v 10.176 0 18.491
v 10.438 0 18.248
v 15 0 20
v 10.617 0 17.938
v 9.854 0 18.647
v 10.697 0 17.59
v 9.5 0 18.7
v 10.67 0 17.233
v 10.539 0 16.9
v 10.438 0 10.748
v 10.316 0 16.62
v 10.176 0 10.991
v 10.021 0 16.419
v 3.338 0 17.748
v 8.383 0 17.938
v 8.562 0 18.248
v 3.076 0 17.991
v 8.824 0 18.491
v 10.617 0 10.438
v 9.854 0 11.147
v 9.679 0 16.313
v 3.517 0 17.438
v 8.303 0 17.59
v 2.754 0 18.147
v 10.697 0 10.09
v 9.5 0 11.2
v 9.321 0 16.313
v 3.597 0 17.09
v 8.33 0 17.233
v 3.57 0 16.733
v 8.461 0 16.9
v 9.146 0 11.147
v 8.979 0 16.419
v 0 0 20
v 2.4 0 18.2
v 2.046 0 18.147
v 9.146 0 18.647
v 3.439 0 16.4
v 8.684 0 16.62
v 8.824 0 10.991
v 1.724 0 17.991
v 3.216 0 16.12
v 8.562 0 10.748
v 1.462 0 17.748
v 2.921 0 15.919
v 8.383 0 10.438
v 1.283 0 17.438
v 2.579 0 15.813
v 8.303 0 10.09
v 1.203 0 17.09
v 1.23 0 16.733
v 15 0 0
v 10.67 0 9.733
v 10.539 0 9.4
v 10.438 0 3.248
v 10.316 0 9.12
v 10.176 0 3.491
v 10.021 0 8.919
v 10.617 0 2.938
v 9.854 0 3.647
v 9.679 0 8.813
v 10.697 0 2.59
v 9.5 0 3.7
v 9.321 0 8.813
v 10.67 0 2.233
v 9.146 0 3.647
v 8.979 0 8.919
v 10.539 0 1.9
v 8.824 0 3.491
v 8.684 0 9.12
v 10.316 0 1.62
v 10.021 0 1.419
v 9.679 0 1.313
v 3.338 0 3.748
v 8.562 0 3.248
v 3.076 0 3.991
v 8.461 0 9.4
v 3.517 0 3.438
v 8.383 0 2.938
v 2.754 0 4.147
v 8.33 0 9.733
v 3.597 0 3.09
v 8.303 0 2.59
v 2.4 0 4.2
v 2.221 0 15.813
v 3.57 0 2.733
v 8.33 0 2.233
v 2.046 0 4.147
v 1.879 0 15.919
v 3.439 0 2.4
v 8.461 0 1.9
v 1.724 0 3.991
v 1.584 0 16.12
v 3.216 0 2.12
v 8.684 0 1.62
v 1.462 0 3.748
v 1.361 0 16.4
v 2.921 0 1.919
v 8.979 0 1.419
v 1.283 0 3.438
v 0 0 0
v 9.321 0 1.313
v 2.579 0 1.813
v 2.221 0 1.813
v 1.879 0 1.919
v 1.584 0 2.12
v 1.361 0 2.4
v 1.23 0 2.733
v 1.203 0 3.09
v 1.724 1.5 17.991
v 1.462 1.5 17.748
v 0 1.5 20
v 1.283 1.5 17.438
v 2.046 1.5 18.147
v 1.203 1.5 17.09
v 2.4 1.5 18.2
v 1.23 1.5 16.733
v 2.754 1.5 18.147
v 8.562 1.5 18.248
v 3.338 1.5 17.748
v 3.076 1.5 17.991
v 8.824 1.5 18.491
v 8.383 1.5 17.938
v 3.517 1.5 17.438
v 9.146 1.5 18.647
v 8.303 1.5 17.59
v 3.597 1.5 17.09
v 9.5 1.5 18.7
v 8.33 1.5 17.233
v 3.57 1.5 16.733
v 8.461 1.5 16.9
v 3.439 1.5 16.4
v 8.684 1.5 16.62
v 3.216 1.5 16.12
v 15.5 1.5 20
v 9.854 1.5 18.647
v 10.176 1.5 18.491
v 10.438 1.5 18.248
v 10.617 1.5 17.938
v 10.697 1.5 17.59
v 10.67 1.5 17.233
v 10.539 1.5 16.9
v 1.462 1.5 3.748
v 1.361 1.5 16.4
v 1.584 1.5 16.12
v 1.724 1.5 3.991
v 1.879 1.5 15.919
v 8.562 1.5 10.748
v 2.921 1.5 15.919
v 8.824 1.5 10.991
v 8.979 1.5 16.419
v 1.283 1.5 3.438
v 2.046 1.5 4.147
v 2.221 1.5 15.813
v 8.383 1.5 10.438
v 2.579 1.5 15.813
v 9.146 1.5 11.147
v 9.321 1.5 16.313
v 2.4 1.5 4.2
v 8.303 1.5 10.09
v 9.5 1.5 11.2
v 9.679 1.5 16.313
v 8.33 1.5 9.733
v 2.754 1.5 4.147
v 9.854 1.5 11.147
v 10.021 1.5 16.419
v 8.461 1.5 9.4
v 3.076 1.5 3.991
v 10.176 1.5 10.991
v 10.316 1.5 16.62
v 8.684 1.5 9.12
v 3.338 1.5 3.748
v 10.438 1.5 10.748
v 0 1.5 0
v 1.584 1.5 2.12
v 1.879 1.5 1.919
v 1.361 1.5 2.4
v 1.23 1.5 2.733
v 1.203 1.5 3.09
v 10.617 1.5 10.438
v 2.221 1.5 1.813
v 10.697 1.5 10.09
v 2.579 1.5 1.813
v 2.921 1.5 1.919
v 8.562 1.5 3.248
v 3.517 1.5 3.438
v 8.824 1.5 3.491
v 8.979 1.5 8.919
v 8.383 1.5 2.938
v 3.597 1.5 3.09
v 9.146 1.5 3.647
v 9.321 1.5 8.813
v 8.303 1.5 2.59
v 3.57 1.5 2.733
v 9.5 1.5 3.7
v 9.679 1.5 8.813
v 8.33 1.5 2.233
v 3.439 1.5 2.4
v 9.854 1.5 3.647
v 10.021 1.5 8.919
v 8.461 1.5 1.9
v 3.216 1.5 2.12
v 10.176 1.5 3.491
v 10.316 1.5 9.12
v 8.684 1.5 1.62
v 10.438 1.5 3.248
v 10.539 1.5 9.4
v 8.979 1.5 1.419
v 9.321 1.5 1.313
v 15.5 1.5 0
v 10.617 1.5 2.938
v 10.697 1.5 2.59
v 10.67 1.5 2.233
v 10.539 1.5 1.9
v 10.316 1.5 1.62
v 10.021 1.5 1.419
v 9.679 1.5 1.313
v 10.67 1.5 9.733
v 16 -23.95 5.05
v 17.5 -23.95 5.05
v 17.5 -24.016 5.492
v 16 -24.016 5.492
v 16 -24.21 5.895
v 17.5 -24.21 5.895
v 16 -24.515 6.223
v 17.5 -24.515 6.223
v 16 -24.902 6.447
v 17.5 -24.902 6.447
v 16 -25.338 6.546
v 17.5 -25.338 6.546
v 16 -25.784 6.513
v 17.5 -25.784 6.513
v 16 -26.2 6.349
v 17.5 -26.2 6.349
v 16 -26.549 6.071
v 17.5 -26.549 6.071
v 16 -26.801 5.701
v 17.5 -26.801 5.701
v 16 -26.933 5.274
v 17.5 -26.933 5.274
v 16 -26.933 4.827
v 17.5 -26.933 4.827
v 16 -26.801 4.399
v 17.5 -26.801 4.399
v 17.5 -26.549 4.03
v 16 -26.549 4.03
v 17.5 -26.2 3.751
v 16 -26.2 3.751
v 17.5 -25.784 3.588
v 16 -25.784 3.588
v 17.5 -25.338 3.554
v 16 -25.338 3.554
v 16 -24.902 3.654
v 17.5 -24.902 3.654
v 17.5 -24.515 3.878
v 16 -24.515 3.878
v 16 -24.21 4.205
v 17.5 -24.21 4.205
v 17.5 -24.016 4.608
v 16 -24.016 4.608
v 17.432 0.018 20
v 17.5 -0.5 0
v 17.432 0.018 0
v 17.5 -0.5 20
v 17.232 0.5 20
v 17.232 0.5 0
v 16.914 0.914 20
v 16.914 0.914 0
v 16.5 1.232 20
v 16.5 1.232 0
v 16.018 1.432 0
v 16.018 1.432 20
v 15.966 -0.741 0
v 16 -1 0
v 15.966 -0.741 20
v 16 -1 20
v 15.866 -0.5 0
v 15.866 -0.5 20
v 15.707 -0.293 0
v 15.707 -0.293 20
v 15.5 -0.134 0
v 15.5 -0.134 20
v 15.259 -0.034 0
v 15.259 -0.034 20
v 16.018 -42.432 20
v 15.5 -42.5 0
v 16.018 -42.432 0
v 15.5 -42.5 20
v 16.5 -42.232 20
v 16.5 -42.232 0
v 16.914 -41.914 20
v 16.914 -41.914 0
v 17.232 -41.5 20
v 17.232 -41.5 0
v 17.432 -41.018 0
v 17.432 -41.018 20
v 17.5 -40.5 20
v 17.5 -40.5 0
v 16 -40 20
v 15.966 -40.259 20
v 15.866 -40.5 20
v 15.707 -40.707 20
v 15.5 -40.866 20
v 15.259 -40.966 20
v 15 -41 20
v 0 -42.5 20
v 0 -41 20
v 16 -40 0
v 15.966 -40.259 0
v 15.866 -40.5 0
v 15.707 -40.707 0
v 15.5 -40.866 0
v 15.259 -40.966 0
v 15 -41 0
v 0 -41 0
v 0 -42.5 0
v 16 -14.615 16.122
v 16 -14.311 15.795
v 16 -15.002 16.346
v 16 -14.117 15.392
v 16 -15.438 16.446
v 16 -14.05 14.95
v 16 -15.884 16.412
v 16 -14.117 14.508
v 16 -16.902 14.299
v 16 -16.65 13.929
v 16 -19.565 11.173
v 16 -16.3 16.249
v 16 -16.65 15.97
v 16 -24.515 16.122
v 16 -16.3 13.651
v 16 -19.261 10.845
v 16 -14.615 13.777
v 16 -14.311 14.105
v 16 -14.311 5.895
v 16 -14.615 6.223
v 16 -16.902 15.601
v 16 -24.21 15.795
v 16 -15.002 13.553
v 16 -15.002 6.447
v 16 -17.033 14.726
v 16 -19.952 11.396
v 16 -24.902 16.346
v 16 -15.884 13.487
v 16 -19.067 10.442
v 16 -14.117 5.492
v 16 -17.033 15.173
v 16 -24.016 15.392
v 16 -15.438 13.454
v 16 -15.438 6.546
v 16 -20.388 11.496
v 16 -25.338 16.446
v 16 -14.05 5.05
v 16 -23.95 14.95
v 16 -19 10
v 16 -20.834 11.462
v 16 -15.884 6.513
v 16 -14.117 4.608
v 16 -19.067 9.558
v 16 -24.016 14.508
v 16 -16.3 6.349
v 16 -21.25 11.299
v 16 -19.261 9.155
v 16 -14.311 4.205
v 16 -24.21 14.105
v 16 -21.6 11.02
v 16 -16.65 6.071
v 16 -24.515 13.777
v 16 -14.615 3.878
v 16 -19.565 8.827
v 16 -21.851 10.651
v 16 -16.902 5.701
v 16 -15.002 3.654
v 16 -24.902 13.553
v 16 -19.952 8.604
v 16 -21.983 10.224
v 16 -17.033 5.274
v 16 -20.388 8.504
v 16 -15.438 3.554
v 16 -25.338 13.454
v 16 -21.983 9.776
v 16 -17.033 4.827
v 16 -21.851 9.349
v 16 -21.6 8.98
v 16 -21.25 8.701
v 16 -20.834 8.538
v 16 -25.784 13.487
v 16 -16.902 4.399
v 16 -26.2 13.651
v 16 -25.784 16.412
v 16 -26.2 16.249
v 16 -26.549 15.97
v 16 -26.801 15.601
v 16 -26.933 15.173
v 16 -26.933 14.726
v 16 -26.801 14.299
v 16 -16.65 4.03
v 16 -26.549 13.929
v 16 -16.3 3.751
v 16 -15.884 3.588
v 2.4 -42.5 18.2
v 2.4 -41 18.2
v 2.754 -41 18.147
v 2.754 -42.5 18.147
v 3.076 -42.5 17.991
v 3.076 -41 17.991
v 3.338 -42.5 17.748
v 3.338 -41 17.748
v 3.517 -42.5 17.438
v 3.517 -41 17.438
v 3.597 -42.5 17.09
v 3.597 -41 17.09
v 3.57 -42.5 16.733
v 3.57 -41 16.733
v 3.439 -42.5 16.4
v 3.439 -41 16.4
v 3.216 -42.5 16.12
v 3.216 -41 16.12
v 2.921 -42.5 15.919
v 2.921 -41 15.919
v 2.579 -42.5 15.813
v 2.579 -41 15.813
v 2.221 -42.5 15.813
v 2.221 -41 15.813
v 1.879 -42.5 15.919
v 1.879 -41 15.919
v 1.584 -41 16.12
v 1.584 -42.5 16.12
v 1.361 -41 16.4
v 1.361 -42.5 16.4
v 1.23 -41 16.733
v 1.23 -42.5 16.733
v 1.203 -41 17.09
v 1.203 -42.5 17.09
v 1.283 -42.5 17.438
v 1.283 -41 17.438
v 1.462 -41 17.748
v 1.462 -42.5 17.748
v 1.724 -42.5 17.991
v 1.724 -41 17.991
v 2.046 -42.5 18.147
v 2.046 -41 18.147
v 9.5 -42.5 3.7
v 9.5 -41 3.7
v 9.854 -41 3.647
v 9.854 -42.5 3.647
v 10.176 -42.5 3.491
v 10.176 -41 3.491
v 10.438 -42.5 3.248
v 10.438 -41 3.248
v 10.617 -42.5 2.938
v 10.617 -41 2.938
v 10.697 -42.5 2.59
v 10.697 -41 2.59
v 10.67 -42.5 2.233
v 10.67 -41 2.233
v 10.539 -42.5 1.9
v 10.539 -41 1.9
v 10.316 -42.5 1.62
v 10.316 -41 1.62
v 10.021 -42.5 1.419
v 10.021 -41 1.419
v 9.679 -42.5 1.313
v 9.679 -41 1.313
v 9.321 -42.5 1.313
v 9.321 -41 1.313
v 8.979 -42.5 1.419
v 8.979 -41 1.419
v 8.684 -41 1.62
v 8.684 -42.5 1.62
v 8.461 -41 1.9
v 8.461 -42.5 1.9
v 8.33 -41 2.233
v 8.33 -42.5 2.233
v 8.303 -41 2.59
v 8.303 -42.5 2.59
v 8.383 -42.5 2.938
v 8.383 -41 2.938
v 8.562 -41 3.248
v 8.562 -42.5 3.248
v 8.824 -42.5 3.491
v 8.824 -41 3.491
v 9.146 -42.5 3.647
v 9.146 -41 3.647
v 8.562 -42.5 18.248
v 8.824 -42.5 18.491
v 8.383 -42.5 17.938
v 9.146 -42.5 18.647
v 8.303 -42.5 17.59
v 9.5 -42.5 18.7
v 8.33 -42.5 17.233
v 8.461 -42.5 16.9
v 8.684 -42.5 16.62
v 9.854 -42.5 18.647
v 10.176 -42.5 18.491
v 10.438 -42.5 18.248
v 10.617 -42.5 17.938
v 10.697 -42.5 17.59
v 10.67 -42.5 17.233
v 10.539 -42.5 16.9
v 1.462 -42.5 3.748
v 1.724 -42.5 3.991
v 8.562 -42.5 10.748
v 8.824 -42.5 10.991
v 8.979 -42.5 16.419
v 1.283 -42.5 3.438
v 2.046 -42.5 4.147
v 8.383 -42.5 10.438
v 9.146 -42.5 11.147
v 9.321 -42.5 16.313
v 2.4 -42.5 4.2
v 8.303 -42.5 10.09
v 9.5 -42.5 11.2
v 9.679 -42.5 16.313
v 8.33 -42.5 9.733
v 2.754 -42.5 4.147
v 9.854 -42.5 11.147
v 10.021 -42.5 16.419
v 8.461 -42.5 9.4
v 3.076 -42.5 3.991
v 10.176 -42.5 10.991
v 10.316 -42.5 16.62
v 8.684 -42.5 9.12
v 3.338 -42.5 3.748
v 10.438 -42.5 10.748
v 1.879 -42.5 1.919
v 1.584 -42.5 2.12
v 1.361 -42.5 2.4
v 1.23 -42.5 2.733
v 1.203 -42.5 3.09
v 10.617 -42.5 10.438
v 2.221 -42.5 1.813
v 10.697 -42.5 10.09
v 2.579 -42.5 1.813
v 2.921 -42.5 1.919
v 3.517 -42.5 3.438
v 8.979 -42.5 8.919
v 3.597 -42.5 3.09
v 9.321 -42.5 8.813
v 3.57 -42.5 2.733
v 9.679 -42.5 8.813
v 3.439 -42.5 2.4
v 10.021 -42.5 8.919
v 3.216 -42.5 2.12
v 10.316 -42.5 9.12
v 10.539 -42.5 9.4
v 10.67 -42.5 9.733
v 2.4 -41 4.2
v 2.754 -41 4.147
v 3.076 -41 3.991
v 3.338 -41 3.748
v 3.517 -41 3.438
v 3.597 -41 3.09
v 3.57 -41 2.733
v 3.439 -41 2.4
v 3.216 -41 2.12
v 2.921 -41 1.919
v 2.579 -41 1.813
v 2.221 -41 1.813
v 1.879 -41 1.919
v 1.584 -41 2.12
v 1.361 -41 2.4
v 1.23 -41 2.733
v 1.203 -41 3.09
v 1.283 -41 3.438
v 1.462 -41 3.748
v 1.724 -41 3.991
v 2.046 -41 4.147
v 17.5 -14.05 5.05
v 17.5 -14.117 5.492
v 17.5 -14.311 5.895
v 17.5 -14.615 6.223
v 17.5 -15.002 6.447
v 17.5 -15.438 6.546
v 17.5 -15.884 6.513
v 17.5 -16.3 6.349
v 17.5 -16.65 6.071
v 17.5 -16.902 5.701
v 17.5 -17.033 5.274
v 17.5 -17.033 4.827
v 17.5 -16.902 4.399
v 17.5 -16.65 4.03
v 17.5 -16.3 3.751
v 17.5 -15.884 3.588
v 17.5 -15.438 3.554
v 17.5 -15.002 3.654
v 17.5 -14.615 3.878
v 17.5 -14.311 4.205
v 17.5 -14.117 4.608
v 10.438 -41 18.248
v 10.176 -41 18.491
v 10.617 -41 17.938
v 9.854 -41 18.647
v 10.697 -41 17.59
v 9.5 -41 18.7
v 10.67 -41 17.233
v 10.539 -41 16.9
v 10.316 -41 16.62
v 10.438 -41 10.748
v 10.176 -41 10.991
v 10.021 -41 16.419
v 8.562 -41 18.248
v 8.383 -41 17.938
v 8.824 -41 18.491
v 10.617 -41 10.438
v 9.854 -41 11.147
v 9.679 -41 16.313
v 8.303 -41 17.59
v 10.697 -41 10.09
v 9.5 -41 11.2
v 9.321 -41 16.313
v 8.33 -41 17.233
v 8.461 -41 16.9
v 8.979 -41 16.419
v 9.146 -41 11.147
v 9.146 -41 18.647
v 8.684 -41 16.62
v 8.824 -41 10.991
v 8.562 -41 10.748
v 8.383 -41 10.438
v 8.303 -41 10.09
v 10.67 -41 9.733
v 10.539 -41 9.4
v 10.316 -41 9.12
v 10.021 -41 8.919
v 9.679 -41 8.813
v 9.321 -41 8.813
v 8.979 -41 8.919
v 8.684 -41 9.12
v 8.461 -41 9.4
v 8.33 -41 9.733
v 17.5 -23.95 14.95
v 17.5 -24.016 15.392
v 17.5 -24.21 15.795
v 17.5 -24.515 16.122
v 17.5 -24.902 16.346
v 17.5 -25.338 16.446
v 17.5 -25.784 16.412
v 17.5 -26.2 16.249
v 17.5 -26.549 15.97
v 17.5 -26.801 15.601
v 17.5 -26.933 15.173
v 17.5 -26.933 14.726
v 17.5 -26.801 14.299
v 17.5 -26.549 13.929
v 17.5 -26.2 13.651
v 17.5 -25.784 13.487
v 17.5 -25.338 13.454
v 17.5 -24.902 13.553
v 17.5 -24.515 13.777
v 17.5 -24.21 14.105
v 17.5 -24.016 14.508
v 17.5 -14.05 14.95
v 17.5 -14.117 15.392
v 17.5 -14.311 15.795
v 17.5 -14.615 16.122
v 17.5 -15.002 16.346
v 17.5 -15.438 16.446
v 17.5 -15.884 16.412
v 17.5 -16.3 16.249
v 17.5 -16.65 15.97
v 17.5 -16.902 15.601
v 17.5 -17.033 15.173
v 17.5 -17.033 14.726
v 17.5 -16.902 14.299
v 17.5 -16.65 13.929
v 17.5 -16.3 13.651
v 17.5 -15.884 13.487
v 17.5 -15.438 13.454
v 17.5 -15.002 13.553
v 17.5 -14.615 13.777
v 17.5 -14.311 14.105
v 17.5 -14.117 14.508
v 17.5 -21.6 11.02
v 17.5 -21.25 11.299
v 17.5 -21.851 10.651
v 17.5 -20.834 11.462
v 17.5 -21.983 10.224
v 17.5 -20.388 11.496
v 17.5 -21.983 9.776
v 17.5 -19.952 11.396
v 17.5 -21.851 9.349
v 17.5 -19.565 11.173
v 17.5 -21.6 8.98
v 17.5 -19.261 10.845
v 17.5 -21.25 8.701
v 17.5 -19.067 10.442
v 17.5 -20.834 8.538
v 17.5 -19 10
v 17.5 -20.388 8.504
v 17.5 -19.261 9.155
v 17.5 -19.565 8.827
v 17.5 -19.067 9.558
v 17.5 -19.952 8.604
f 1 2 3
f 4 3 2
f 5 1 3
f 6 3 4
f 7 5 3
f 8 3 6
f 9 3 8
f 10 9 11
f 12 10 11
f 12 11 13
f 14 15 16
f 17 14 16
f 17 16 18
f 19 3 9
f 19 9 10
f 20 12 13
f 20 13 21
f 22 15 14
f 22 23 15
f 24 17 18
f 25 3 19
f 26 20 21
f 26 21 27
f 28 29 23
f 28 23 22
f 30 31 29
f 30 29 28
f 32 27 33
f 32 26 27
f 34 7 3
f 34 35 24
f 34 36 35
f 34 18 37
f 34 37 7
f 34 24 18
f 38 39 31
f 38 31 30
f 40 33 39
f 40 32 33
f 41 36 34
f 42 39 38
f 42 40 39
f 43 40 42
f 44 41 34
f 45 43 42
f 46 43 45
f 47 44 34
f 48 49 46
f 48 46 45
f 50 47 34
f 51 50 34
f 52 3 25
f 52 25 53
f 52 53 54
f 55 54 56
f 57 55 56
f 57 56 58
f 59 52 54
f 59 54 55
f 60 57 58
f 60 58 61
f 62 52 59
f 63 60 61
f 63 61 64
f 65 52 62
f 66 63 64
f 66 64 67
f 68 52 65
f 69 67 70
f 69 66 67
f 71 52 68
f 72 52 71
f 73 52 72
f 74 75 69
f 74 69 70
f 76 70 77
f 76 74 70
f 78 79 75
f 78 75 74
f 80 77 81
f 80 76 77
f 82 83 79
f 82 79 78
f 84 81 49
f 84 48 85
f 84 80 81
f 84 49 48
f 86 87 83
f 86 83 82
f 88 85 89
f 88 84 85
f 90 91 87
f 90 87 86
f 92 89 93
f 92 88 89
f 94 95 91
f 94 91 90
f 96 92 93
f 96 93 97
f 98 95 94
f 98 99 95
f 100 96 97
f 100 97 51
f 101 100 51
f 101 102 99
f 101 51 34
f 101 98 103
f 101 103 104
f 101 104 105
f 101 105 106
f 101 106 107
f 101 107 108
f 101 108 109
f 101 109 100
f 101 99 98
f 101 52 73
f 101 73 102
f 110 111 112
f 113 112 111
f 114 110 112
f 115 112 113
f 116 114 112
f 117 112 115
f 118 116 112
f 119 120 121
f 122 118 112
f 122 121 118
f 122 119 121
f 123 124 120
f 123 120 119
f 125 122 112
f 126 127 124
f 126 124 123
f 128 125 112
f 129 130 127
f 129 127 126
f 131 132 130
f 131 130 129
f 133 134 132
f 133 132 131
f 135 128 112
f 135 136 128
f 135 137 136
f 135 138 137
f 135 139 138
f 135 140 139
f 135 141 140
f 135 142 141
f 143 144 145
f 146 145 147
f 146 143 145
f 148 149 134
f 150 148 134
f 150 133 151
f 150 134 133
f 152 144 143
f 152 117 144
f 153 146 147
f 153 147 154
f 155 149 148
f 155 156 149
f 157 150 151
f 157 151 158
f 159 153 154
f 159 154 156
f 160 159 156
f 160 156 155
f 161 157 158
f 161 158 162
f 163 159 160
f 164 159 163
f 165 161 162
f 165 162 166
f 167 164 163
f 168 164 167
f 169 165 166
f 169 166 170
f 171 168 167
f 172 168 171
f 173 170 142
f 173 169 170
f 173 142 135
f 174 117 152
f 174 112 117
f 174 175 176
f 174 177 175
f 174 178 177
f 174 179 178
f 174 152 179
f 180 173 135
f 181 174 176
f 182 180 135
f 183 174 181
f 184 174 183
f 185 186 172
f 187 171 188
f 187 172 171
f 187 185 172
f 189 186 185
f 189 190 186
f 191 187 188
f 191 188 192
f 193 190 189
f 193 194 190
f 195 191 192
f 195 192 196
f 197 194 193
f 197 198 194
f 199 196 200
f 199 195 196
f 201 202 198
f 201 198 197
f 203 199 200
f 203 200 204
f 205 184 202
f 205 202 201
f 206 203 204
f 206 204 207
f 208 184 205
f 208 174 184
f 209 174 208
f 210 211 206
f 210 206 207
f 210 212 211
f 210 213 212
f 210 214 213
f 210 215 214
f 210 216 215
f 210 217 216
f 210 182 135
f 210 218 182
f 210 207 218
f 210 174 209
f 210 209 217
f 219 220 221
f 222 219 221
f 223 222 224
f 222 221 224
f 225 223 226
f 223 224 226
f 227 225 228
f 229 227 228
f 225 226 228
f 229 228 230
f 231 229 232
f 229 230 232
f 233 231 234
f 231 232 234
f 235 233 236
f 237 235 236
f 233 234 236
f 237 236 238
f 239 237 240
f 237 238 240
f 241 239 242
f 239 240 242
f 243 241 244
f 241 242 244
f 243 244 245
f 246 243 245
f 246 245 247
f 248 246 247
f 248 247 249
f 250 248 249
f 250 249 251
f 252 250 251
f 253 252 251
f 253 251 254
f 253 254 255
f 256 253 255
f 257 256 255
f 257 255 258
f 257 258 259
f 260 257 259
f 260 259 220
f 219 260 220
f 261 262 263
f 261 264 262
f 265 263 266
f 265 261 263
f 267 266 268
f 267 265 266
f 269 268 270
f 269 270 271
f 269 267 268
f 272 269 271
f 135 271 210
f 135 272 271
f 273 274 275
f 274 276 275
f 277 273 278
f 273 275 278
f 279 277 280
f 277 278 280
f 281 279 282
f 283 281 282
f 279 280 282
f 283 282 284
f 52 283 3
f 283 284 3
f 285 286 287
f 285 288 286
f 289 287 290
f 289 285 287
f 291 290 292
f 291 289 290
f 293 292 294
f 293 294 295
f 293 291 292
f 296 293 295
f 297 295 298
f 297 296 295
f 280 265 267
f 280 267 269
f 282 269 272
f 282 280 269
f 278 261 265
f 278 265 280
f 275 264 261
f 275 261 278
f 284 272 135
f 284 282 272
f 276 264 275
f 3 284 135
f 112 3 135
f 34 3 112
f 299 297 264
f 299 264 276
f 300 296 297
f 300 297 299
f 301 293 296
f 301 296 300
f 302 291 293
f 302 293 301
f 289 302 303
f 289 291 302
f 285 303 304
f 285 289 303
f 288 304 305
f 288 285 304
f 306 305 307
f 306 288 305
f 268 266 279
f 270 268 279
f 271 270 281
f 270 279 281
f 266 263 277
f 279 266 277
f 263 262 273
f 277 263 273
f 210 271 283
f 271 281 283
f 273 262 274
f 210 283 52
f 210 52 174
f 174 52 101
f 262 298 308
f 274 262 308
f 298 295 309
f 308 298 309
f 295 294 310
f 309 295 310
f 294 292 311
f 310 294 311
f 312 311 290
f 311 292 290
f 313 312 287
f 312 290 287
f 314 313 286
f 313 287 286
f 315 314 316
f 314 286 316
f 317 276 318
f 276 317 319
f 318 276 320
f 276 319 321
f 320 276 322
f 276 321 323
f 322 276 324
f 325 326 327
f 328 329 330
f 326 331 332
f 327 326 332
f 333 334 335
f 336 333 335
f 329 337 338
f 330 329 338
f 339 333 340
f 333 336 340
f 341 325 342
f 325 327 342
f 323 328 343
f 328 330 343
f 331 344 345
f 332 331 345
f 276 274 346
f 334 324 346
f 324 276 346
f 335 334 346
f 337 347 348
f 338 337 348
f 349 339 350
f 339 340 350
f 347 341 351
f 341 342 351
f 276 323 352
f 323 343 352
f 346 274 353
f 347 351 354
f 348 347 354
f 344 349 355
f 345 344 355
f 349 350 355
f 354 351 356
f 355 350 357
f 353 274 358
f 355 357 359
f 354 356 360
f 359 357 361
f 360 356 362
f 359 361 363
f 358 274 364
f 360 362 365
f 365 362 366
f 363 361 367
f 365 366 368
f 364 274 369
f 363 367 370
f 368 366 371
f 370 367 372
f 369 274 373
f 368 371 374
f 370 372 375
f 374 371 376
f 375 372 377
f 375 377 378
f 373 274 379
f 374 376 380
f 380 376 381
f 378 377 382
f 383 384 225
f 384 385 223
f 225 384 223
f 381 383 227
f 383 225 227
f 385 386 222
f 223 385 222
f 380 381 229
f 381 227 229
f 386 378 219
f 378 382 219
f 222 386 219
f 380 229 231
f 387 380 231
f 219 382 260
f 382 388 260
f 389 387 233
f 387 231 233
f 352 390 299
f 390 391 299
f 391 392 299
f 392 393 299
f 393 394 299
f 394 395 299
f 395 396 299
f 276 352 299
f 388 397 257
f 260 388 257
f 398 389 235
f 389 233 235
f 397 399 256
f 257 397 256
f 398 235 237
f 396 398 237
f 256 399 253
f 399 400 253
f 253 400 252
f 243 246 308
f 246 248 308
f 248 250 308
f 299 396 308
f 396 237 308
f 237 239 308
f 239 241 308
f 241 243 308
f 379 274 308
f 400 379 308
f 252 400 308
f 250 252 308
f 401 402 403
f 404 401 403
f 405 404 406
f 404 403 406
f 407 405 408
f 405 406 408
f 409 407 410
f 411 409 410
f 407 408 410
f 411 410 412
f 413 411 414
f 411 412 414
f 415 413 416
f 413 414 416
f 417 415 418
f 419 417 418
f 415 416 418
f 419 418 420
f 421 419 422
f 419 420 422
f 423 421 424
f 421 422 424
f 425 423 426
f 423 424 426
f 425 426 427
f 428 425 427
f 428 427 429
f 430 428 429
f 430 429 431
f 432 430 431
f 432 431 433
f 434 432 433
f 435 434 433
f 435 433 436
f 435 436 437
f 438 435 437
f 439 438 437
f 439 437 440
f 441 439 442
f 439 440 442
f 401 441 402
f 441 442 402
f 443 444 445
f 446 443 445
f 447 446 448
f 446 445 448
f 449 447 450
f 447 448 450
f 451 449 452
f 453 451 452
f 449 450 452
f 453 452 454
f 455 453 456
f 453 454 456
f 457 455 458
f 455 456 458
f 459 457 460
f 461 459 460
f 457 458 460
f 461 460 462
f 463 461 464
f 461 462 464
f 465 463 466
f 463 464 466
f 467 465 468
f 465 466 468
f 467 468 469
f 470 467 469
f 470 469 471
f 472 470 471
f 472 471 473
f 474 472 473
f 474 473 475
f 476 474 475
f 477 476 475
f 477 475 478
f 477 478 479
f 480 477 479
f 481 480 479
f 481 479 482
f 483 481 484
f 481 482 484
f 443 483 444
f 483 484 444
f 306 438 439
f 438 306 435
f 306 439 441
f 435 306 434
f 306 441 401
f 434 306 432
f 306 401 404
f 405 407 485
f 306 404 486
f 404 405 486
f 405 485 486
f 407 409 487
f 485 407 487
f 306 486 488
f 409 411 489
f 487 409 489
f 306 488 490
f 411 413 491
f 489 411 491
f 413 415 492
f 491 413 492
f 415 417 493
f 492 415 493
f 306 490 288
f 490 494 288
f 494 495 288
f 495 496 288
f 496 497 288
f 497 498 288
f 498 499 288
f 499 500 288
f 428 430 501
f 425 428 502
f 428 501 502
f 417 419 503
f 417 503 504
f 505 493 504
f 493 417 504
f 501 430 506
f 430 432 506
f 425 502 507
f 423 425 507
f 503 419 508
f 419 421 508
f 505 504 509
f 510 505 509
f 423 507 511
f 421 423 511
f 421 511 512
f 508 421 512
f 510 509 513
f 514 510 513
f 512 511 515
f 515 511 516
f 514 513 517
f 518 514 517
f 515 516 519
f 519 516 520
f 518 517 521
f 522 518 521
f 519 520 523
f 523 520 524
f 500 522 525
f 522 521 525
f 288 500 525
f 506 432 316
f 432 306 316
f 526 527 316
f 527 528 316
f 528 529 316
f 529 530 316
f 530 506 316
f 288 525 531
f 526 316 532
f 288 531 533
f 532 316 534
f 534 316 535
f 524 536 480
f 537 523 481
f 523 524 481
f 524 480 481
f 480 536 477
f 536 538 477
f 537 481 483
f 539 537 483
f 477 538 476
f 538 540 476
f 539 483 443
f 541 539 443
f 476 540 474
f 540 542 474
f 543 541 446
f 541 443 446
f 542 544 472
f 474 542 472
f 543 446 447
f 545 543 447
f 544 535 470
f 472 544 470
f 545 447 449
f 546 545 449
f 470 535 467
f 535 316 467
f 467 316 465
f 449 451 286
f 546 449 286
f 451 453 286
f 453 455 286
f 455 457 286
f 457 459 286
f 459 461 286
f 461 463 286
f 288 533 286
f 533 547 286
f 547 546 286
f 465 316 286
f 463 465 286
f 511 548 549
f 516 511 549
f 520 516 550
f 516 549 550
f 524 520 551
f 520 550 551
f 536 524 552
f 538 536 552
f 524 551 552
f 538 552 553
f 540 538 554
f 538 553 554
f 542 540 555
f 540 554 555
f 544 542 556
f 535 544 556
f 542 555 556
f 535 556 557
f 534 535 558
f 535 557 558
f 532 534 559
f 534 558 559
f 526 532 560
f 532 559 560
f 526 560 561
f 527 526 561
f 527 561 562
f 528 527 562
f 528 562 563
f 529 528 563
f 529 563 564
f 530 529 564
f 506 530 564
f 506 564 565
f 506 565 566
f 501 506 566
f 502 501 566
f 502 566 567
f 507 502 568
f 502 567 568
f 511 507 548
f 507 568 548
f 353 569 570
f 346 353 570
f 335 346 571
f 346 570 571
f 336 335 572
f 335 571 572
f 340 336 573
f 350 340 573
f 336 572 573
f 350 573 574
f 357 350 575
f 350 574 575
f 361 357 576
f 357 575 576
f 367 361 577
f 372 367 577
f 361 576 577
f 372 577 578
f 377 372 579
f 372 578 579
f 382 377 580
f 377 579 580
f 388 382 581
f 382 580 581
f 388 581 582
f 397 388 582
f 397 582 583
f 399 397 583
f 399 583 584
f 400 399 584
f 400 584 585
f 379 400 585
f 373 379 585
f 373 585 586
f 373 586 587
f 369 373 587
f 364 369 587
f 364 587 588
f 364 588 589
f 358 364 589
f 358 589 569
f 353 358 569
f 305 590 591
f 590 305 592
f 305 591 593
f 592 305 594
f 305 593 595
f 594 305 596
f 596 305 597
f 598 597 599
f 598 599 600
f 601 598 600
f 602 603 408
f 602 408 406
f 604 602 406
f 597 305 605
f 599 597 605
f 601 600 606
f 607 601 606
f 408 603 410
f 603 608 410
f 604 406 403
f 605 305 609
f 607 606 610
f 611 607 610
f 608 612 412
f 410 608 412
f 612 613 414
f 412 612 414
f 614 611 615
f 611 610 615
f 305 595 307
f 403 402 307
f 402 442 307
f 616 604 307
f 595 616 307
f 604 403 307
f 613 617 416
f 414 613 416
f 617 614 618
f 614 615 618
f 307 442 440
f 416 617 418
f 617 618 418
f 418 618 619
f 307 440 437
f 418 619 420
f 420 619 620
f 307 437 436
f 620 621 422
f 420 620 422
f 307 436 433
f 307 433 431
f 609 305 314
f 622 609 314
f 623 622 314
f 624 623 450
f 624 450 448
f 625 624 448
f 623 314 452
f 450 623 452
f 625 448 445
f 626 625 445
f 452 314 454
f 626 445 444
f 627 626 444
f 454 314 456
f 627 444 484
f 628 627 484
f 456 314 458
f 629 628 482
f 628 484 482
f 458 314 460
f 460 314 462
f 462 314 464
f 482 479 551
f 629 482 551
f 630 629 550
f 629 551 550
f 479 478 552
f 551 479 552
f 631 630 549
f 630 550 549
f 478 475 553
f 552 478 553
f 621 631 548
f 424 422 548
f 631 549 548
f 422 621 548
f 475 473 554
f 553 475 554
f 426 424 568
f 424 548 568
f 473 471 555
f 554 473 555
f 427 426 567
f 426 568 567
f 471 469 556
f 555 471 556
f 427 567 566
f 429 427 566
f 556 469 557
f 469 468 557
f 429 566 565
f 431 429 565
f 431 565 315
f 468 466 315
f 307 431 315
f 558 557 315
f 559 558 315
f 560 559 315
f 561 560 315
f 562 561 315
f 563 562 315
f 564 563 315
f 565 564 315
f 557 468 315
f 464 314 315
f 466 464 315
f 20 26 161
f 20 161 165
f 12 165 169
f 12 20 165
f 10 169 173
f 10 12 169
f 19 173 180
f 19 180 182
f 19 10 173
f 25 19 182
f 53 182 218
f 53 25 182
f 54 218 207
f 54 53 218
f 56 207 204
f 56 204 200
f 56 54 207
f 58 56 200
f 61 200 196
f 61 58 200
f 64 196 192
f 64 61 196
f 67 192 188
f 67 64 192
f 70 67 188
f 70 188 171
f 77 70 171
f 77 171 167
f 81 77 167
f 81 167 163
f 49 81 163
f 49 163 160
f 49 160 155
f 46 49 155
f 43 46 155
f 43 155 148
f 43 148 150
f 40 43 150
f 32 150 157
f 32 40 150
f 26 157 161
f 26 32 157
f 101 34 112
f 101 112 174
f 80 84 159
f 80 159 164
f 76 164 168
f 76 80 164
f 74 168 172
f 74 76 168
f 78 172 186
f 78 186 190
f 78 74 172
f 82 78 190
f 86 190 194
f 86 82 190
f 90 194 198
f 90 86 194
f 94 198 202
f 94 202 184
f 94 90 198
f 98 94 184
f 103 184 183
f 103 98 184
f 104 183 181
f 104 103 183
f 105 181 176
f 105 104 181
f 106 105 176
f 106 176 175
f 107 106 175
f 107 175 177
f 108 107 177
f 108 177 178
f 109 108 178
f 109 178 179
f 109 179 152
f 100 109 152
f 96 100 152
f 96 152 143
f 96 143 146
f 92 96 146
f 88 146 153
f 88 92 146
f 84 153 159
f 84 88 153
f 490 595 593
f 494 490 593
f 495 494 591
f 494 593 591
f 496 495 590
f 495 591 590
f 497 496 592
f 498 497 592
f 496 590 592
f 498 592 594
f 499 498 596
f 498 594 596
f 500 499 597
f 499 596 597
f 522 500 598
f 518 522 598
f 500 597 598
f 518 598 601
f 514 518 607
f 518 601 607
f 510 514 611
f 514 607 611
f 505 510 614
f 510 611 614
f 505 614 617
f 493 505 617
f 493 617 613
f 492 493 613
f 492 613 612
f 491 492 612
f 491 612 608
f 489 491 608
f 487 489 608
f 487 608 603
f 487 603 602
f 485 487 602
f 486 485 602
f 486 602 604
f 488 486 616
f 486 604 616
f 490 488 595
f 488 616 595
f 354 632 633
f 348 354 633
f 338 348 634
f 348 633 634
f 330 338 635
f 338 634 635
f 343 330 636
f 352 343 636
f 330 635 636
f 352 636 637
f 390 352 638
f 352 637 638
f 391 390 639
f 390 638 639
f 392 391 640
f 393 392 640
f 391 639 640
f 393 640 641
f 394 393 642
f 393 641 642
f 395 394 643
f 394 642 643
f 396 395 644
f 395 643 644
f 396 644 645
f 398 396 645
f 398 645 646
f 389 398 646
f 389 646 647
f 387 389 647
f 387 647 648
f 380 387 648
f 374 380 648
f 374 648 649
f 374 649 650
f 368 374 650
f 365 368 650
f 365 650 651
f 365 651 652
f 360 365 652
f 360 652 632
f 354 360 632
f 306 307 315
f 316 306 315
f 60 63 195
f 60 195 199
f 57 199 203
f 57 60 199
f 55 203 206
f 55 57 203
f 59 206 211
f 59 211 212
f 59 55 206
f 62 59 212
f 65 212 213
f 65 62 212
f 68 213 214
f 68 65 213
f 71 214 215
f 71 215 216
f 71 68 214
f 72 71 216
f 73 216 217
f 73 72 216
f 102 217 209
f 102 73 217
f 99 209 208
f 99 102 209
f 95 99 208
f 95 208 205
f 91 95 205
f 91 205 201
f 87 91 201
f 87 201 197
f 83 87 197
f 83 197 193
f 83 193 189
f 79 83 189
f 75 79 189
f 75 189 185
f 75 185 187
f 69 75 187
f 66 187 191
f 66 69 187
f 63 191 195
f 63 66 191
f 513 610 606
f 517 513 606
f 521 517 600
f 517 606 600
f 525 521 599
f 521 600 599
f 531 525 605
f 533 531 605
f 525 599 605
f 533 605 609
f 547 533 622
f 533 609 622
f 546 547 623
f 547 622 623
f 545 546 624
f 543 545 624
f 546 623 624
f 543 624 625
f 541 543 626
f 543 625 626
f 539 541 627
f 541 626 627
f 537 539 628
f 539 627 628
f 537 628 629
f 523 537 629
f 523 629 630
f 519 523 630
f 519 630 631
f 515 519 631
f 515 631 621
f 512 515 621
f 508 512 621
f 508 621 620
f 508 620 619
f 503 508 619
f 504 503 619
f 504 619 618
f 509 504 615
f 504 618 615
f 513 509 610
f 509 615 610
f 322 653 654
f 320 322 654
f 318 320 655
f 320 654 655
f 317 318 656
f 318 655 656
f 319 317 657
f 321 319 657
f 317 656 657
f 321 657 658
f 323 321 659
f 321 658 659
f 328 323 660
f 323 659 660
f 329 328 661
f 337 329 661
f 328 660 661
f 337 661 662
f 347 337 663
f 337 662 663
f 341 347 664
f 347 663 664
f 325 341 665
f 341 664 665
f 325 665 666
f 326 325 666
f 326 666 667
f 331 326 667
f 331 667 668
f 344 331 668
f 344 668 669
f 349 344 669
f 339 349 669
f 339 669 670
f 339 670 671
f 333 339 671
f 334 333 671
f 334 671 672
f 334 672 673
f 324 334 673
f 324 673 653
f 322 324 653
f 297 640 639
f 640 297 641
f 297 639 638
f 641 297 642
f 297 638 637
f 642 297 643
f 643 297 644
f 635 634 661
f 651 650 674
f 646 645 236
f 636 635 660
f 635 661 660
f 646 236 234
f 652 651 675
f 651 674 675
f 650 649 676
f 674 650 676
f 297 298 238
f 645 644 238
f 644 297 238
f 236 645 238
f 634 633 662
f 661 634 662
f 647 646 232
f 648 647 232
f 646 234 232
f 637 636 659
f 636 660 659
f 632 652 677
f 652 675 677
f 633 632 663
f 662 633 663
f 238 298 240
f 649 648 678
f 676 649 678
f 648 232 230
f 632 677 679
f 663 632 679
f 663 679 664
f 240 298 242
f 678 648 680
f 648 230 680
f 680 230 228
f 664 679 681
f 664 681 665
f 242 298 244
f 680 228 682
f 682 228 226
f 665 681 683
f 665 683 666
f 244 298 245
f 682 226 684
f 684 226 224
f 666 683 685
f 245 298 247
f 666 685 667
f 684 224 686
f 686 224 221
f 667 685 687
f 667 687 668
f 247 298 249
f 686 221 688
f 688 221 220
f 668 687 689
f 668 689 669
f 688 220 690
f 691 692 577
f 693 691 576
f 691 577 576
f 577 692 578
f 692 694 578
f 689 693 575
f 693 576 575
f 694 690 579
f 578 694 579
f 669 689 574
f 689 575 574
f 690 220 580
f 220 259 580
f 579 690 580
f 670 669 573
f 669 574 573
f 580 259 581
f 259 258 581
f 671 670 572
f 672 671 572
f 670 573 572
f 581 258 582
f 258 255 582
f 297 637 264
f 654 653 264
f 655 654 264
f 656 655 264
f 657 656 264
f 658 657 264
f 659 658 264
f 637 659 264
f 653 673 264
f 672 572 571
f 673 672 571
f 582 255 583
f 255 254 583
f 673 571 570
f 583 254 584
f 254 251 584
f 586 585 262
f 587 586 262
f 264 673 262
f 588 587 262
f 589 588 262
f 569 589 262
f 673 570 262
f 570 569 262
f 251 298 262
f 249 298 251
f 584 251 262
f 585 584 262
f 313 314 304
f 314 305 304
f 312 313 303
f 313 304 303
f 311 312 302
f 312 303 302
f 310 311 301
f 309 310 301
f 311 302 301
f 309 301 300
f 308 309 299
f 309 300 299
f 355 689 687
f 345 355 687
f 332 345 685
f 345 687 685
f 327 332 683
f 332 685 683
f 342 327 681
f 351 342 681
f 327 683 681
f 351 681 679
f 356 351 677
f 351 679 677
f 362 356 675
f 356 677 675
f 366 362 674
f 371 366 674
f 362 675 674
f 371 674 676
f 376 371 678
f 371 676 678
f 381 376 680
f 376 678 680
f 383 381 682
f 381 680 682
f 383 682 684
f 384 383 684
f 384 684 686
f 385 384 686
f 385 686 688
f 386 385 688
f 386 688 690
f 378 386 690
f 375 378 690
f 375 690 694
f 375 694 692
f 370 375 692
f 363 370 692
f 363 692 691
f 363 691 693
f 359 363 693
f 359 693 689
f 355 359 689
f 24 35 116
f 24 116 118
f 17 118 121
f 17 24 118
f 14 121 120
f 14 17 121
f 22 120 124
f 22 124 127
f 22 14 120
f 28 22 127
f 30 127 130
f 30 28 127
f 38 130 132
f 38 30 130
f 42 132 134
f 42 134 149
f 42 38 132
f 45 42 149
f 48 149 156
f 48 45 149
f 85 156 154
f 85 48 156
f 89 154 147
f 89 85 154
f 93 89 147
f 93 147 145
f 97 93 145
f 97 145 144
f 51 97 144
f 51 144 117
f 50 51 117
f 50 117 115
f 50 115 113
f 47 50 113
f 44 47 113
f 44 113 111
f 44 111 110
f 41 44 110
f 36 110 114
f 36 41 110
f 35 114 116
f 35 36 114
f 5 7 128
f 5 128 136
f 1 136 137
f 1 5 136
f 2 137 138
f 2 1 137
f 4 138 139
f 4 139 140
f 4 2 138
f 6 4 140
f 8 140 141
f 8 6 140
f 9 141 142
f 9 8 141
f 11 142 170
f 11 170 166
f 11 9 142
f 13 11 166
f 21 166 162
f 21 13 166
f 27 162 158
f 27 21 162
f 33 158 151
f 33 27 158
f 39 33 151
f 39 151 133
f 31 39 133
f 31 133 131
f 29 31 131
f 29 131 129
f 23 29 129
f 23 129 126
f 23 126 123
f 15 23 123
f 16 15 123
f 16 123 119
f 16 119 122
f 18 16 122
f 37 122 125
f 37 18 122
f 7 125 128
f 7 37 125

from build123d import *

# Parameters (mm, degrees)
SKETCH_1_W          = 12
SKETCH_1_H          = 20
SKETCH_1_R          = 1.2
EXTRUDE_1_DEPTH     = 1.5
EXTRUDE_2_DEPTH     = 20
SKETCH_3_R          = 1.5
CUT_EXTRUDE_1_DEPTH = 10
FILLET_1_R          = 2
FILLET_2_R          = 1


with BuildPart() as part:
    # 草图1 → 凸台-拉伸1 (new body)
    with BuildSketch(Plane(origin=(0, 0, 0), x_dir=(1, 0, 0), z_dir=(0, 1, 0))):
        with Locations((6, -10)):
            Rectangle(SKETCH_1_W, SKETCH_1_H)
        with Locations(Location((2.4, -3, 0), (0, 0, 270))):
            Circle(SKETCH_1_R, mode=Mode.SUBTRACT)
        with Locations(Location((9.5, -2.5, 0), (0, 0, 270))):
            Circle(SKETCH_1_R, mode=Mode.SUBTRACT)
        with Locations(Location((2.4, -17, 0), (0, 0, 270))):
            Circle(SKETCH_1_R, mode=Mode.SUBTRACT)
        with Locations(Location((9.5, -10, 0), (0, 0, 270))):
            Circle(SKETCH_1_R, mode=Mode.SUBTRACT)
        with Locations(Location((9.5, -17.5, 0), (0, 0, 270))):
            Circle(SKETCH_1_R, mode=Mode.SUBTRACT)
    extrude(amount=EXTRUDE_1_DEPTH)

    # 草图2 → 凸台-拉伸2 (add)
    with BuildSketch(Plane(origin=(0, 0, 0), x_dir=(-1, 0, 0), z_dir=(0, 0, -1))):
        Polygon((-16, -20.5), (-16, 0), (-12, 0), (-12, 1.5), (-17.5, 1.5), (-17.5, -20.5), align=None)
    extrude(amount=-EXTRUDE_2_DEPTH)

    # 镜向2: part across plane


with BuildPart() as part_1:
    add(part.part)
    add(part.part.mirror(Plane(origin=(0, -20.5, 20), x_dir=(0, 0, 1), z_dir=(0, -1, 0))))

    # 草图3 → 切除-拉伸1 (cut)
    with BuildSketch(Plane(origin=(17.5, 0, 0), x_dir=(0, 0, -1), z_dir=(1, 0, 0))):
        with Locations(Location((-10, -20.5, 0), (0, 0, 90))):
            Circle(SKETCH_3_R)
        with Locations(Location((-14.949747468, -15.550252532, 0), (0, 0, 90))):
            Circle(SKETCH_3_R)
        with Locations(Location((-5.050252532, -15.550252532, 0), (0, 0, 90))):
            Circle(SKETCH_3_R)
        with Locations(Location((-5.050252532, -25.449747468, 0), (0, 0, 90))):
            Circle(SKETCH_3_R)
        with Locations(Location((-14.949747468, -25.449747468, 0), (0, 0, 90))):
            Circle(SKETCH_3_R)
    extrude(amount=-CUT_EXTRUDE_1_DEPTH, mode=Mode.SUBTRACT)

    # 圆角1
    fillet_1_edges = [part_1.edges().sort_by_distance(p)[0] for p in [
        (17.5, 1.5, 10),
        (17.5, -42.5, 10),
    ]]
    fillet(fillet_1_edges, radius=FILLET_1_R)

    # 圆角2
    fillet_2_edges = [part_1.edges().sort_by_distance(p)[0] for p in [
        (16, 0, 10),
        (16, -41, 10),
    ]]
    fillet(fillet_2_edges, radius=FILLET_2_R)


solid = part_1.part
